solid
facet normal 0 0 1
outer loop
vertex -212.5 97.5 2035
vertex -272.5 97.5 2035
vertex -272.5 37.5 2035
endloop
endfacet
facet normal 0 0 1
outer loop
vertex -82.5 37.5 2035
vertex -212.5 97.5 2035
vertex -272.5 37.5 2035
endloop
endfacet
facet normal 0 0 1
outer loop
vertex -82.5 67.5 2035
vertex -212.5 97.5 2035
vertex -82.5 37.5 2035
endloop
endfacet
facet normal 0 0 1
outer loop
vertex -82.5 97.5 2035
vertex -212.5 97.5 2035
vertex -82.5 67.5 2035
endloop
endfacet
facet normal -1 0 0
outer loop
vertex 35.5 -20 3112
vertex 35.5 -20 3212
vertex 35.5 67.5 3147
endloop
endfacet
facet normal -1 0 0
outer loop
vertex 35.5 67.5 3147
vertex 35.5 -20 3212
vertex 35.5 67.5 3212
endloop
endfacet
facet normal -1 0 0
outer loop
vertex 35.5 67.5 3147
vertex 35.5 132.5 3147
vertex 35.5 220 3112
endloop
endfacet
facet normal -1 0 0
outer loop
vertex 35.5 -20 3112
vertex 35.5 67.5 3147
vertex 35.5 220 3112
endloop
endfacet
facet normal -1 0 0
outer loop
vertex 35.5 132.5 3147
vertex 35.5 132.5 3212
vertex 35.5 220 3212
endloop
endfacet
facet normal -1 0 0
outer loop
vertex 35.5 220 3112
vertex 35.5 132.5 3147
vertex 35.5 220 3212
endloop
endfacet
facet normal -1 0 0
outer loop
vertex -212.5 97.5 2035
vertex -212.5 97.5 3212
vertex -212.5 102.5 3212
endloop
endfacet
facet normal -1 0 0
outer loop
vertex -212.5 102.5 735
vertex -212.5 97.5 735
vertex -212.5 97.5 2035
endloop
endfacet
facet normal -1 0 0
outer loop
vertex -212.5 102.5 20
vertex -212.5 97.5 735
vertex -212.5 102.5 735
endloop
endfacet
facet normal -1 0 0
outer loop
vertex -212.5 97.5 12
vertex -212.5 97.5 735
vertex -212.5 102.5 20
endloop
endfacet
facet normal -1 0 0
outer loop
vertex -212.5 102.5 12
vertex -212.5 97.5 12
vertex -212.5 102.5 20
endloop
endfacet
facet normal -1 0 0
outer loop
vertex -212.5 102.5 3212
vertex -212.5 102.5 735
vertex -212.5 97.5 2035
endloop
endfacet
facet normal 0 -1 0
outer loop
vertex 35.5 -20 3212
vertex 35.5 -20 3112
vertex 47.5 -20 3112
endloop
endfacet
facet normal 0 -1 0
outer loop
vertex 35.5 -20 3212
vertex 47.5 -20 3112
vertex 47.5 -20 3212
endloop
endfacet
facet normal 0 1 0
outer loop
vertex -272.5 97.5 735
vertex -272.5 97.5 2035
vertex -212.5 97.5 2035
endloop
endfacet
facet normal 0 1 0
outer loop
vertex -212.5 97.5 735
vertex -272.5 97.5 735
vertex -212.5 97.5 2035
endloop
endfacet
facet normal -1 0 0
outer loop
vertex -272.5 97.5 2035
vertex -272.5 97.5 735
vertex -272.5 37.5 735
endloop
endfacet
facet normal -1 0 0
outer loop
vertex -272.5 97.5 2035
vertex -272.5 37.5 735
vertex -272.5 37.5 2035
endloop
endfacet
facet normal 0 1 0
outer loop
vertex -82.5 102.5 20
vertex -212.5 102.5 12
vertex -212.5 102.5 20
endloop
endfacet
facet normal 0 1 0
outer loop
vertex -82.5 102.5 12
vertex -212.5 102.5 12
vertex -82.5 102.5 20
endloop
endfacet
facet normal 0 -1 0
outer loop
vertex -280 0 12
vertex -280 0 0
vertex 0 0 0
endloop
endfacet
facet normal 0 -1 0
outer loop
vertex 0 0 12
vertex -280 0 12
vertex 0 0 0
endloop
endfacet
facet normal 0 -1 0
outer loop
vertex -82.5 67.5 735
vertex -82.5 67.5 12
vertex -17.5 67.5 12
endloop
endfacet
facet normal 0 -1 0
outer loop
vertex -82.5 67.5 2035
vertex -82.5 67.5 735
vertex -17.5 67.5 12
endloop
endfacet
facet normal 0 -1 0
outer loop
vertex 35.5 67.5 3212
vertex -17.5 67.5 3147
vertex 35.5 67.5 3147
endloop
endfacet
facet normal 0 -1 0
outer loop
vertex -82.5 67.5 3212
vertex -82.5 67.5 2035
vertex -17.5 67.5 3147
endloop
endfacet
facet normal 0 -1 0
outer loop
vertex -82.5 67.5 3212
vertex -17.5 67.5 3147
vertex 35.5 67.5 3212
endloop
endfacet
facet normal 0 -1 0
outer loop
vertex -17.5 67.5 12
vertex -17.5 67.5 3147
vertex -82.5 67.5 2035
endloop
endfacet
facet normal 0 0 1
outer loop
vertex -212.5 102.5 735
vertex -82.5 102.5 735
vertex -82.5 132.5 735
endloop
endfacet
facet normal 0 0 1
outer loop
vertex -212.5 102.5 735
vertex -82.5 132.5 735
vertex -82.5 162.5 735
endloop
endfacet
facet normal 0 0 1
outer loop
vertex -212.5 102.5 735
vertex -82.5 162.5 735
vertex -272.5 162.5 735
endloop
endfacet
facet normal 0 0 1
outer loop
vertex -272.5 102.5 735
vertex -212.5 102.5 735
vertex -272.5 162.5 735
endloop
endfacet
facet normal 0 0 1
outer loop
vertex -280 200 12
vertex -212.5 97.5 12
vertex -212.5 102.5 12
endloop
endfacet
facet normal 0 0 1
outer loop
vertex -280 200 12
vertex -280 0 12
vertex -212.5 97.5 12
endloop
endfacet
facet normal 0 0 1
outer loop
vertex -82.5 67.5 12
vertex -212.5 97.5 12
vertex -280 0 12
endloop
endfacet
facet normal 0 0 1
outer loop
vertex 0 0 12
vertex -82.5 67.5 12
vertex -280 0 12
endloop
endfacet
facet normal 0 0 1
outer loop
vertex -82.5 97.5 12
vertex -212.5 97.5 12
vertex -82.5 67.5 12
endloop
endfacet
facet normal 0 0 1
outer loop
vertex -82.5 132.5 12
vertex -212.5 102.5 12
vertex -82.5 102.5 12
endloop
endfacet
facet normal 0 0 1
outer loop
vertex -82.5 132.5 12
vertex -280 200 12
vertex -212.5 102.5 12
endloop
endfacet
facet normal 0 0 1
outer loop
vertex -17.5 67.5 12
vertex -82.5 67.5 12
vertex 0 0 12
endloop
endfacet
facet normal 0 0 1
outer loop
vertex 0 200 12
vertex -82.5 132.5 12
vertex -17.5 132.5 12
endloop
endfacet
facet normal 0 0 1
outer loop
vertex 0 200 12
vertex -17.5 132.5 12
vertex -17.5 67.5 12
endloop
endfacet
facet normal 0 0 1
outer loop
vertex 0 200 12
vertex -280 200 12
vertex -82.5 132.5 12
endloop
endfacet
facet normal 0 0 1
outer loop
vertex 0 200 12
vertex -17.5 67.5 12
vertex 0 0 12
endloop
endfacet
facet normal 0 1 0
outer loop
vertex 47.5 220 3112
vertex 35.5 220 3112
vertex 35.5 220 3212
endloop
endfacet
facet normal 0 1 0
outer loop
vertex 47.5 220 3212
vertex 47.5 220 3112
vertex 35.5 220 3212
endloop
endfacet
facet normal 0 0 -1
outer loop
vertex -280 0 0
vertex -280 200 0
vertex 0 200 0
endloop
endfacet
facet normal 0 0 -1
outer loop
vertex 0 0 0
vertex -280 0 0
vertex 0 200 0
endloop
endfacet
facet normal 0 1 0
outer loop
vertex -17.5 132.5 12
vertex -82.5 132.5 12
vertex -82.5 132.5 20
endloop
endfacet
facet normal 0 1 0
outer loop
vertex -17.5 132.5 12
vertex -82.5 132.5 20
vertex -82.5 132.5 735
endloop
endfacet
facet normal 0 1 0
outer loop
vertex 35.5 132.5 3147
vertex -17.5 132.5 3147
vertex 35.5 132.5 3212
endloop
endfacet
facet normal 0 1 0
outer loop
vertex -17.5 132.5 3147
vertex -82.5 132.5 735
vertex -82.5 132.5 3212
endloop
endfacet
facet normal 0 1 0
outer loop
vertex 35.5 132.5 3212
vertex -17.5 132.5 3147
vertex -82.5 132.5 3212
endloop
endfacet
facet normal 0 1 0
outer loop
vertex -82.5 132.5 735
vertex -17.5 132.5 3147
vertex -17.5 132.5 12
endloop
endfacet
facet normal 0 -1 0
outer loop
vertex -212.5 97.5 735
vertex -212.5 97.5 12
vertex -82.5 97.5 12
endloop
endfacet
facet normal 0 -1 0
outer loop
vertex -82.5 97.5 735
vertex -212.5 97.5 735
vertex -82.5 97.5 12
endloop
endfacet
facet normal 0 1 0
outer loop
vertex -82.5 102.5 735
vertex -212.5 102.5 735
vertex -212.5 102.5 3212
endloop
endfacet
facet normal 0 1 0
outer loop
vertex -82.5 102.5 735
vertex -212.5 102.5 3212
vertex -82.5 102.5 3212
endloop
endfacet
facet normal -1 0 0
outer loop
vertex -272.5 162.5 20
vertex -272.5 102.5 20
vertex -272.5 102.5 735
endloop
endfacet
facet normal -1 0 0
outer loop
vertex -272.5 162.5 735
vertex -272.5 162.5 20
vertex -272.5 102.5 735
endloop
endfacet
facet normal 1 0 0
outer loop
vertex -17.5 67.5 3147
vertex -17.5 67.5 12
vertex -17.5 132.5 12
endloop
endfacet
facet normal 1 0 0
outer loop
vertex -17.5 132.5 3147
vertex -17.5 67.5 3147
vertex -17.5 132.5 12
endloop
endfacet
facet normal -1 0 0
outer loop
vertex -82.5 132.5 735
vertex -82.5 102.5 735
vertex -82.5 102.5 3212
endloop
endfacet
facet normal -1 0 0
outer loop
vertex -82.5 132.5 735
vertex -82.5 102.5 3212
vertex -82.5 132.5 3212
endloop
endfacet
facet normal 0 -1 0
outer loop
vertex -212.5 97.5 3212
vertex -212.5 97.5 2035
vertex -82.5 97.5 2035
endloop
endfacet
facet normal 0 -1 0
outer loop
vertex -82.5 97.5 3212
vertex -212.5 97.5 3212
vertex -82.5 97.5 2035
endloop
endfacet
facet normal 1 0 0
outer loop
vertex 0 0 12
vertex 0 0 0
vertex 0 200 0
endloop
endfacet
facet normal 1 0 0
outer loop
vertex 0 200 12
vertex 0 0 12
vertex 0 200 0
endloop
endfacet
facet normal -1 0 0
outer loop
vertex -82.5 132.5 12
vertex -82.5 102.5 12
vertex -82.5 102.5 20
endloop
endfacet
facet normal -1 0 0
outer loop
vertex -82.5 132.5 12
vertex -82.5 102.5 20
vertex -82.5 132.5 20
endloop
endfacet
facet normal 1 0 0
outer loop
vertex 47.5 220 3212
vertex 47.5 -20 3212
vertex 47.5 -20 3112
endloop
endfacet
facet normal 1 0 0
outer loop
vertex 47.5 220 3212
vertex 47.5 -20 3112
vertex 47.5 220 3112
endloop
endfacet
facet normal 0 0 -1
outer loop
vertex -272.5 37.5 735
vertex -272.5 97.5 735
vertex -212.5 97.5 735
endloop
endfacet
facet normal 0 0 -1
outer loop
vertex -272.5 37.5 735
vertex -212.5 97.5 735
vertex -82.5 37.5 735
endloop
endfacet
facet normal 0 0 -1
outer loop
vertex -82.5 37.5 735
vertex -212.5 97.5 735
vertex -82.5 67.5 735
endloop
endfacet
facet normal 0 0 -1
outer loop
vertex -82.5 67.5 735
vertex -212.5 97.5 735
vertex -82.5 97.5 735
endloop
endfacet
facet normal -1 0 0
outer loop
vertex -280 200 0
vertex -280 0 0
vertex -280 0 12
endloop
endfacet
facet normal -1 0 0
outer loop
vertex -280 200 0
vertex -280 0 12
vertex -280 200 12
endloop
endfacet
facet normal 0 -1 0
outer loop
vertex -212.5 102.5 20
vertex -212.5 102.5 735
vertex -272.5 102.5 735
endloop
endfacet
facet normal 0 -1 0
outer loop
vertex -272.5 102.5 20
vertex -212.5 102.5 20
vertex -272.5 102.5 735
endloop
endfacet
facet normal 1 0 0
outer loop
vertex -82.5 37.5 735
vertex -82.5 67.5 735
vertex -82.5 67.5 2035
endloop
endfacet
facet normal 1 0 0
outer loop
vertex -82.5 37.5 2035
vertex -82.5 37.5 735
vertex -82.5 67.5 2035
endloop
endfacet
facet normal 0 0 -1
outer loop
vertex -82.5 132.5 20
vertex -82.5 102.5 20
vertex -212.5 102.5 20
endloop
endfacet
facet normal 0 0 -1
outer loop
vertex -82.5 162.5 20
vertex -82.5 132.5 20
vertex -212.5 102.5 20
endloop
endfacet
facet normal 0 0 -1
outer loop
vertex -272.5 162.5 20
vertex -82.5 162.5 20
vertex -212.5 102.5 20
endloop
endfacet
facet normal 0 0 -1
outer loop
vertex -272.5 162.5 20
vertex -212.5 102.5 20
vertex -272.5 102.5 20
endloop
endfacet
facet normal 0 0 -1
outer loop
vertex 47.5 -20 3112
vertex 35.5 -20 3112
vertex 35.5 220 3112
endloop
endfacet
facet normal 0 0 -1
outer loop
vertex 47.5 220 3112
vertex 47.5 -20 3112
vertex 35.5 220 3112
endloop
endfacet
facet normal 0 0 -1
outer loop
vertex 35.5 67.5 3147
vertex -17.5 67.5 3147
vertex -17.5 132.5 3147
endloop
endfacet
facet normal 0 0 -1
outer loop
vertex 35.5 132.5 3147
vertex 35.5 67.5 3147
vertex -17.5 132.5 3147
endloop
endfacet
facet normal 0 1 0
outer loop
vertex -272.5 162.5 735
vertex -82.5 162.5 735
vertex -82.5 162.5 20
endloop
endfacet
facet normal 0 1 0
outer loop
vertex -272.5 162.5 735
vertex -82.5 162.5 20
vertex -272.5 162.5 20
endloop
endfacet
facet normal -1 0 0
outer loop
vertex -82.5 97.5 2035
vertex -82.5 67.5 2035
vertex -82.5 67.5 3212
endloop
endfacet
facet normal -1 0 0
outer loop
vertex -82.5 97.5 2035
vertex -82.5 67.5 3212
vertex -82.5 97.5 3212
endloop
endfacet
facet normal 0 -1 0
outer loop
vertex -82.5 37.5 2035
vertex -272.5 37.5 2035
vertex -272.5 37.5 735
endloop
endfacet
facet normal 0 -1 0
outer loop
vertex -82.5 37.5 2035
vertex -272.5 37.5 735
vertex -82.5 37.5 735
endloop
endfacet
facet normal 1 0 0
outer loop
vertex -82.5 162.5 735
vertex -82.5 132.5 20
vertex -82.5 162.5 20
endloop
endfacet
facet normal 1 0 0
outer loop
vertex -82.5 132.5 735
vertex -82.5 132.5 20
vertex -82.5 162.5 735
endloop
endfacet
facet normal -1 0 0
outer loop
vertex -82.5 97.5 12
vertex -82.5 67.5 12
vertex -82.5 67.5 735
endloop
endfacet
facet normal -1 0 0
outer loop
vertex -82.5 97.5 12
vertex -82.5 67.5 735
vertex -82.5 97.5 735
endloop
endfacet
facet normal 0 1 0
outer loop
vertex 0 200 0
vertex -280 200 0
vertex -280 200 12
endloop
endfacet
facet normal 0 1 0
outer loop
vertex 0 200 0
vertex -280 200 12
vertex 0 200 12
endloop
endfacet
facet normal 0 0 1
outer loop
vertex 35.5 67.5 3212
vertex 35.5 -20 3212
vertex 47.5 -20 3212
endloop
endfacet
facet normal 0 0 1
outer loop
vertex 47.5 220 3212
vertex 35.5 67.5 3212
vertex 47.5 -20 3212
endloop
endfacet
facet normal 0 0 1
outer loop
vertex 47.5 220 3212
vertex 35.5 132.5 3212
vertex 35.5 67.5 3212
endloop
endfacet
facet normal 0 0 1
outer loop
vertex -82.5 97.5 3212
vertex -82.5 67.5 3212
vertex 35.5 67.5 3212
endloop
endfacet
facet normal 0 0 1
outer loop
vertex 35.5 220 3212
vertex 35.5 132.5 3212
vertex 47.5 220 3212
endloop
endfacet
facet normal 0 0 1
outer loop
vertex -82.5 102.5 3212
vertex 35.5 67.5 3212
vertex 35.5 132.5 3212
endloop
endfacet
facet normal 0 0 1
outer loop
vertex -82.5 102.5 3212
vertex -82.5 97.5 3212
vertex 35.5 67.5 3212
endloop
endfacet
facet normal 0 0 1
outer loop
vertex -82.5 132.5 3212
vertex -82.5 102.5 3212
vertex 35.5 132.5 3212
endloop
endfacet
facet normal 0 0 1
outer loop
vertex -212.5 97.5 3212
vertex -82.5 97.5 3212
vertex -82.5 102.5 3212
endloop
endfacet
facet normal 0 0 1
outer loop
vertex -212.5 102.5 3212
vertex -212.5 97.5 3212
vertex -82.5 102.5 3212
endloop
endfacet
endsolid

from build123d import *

# Parameters (mm, degrees)
F0_W      = 280
F0_H      = 200
F1_DEPTH  = 12
F2_W      = 65
F2_H      = 65
F3_DEPTH  = 3200
F4_W      = 65
F4_H      = 65
F5_DEPTH  = 53
F6_W      = 240
F6_H      = 100
F7_DEPTH  = 12
F8_W      = 130
F8_H      = 5
F9_DEPTH  = 3200
F10_W     = 190
F10_H     = 715
F11_DEPTH = 60
F12_W     = 190
F12_H     = 1300
F13_DEPTH = 60


with BuildPart() as f1:
    # F0 (on Top) → F1 (new body)
    with BuildSketch(Plane.XY):
        with Locations((-140, 100)):
            Rectangle(F0_W, F0_H)
    extrude(amount=F1_DEPTH)

    # F2 (on face) → F3 (join)
    with BuildSketch(Plane.XY.offset(12)):
        with Locations((-50, 100)):
            Rectangle(F2_W, F2_H)
    extrude(amount=F3_DEPTH)

    # F4 (on face) → F5 (join)
    with BuildSketch(Plane.YZ.offset(-17.5)):
        with Locations((100, 3179.5)):
            Rectangle(F4_W, F4_H)
    extrude(amount=F5_DEPTH)

    # F6 (on face) → F7 (join)
    with BuildSketch(Plane.YZ.offset(35.5)):
        with Locations((100, 3162)):
            Rectangle(F6_W, F6_H)
    extrude(amount=F7_DEPTH)

    # F8 (on face) → F9 (join)
    with BuildSketch(Plane.XY.offset(12)):
        with Locations((-147.5, 100)):
            Rectangle(F8_W, F8_H)
    extrude(amount=F9_DEPTH)

    # F10 (on face) → F11 (join)
    with BuildSketch(Plane(origin=(0, 102.5, 0), x_dir=(-1, 0, 0), z_dir=(0, 1, 0))):
        with Locations((177.5, 377.5)):
            Rectangle(F10_W, F10_H)
    extrude(amount=F11_DEPTH)

    # F12 (on face) → F13 (join)
    with BuildSketch(Plane.XZ.offset(-97.5)):
        with Locations((-177.5, 1385)):
            Rectangle(F12_W, F12_H)
    extrude(amount=F13_DEPTH)


solid = f1.part
